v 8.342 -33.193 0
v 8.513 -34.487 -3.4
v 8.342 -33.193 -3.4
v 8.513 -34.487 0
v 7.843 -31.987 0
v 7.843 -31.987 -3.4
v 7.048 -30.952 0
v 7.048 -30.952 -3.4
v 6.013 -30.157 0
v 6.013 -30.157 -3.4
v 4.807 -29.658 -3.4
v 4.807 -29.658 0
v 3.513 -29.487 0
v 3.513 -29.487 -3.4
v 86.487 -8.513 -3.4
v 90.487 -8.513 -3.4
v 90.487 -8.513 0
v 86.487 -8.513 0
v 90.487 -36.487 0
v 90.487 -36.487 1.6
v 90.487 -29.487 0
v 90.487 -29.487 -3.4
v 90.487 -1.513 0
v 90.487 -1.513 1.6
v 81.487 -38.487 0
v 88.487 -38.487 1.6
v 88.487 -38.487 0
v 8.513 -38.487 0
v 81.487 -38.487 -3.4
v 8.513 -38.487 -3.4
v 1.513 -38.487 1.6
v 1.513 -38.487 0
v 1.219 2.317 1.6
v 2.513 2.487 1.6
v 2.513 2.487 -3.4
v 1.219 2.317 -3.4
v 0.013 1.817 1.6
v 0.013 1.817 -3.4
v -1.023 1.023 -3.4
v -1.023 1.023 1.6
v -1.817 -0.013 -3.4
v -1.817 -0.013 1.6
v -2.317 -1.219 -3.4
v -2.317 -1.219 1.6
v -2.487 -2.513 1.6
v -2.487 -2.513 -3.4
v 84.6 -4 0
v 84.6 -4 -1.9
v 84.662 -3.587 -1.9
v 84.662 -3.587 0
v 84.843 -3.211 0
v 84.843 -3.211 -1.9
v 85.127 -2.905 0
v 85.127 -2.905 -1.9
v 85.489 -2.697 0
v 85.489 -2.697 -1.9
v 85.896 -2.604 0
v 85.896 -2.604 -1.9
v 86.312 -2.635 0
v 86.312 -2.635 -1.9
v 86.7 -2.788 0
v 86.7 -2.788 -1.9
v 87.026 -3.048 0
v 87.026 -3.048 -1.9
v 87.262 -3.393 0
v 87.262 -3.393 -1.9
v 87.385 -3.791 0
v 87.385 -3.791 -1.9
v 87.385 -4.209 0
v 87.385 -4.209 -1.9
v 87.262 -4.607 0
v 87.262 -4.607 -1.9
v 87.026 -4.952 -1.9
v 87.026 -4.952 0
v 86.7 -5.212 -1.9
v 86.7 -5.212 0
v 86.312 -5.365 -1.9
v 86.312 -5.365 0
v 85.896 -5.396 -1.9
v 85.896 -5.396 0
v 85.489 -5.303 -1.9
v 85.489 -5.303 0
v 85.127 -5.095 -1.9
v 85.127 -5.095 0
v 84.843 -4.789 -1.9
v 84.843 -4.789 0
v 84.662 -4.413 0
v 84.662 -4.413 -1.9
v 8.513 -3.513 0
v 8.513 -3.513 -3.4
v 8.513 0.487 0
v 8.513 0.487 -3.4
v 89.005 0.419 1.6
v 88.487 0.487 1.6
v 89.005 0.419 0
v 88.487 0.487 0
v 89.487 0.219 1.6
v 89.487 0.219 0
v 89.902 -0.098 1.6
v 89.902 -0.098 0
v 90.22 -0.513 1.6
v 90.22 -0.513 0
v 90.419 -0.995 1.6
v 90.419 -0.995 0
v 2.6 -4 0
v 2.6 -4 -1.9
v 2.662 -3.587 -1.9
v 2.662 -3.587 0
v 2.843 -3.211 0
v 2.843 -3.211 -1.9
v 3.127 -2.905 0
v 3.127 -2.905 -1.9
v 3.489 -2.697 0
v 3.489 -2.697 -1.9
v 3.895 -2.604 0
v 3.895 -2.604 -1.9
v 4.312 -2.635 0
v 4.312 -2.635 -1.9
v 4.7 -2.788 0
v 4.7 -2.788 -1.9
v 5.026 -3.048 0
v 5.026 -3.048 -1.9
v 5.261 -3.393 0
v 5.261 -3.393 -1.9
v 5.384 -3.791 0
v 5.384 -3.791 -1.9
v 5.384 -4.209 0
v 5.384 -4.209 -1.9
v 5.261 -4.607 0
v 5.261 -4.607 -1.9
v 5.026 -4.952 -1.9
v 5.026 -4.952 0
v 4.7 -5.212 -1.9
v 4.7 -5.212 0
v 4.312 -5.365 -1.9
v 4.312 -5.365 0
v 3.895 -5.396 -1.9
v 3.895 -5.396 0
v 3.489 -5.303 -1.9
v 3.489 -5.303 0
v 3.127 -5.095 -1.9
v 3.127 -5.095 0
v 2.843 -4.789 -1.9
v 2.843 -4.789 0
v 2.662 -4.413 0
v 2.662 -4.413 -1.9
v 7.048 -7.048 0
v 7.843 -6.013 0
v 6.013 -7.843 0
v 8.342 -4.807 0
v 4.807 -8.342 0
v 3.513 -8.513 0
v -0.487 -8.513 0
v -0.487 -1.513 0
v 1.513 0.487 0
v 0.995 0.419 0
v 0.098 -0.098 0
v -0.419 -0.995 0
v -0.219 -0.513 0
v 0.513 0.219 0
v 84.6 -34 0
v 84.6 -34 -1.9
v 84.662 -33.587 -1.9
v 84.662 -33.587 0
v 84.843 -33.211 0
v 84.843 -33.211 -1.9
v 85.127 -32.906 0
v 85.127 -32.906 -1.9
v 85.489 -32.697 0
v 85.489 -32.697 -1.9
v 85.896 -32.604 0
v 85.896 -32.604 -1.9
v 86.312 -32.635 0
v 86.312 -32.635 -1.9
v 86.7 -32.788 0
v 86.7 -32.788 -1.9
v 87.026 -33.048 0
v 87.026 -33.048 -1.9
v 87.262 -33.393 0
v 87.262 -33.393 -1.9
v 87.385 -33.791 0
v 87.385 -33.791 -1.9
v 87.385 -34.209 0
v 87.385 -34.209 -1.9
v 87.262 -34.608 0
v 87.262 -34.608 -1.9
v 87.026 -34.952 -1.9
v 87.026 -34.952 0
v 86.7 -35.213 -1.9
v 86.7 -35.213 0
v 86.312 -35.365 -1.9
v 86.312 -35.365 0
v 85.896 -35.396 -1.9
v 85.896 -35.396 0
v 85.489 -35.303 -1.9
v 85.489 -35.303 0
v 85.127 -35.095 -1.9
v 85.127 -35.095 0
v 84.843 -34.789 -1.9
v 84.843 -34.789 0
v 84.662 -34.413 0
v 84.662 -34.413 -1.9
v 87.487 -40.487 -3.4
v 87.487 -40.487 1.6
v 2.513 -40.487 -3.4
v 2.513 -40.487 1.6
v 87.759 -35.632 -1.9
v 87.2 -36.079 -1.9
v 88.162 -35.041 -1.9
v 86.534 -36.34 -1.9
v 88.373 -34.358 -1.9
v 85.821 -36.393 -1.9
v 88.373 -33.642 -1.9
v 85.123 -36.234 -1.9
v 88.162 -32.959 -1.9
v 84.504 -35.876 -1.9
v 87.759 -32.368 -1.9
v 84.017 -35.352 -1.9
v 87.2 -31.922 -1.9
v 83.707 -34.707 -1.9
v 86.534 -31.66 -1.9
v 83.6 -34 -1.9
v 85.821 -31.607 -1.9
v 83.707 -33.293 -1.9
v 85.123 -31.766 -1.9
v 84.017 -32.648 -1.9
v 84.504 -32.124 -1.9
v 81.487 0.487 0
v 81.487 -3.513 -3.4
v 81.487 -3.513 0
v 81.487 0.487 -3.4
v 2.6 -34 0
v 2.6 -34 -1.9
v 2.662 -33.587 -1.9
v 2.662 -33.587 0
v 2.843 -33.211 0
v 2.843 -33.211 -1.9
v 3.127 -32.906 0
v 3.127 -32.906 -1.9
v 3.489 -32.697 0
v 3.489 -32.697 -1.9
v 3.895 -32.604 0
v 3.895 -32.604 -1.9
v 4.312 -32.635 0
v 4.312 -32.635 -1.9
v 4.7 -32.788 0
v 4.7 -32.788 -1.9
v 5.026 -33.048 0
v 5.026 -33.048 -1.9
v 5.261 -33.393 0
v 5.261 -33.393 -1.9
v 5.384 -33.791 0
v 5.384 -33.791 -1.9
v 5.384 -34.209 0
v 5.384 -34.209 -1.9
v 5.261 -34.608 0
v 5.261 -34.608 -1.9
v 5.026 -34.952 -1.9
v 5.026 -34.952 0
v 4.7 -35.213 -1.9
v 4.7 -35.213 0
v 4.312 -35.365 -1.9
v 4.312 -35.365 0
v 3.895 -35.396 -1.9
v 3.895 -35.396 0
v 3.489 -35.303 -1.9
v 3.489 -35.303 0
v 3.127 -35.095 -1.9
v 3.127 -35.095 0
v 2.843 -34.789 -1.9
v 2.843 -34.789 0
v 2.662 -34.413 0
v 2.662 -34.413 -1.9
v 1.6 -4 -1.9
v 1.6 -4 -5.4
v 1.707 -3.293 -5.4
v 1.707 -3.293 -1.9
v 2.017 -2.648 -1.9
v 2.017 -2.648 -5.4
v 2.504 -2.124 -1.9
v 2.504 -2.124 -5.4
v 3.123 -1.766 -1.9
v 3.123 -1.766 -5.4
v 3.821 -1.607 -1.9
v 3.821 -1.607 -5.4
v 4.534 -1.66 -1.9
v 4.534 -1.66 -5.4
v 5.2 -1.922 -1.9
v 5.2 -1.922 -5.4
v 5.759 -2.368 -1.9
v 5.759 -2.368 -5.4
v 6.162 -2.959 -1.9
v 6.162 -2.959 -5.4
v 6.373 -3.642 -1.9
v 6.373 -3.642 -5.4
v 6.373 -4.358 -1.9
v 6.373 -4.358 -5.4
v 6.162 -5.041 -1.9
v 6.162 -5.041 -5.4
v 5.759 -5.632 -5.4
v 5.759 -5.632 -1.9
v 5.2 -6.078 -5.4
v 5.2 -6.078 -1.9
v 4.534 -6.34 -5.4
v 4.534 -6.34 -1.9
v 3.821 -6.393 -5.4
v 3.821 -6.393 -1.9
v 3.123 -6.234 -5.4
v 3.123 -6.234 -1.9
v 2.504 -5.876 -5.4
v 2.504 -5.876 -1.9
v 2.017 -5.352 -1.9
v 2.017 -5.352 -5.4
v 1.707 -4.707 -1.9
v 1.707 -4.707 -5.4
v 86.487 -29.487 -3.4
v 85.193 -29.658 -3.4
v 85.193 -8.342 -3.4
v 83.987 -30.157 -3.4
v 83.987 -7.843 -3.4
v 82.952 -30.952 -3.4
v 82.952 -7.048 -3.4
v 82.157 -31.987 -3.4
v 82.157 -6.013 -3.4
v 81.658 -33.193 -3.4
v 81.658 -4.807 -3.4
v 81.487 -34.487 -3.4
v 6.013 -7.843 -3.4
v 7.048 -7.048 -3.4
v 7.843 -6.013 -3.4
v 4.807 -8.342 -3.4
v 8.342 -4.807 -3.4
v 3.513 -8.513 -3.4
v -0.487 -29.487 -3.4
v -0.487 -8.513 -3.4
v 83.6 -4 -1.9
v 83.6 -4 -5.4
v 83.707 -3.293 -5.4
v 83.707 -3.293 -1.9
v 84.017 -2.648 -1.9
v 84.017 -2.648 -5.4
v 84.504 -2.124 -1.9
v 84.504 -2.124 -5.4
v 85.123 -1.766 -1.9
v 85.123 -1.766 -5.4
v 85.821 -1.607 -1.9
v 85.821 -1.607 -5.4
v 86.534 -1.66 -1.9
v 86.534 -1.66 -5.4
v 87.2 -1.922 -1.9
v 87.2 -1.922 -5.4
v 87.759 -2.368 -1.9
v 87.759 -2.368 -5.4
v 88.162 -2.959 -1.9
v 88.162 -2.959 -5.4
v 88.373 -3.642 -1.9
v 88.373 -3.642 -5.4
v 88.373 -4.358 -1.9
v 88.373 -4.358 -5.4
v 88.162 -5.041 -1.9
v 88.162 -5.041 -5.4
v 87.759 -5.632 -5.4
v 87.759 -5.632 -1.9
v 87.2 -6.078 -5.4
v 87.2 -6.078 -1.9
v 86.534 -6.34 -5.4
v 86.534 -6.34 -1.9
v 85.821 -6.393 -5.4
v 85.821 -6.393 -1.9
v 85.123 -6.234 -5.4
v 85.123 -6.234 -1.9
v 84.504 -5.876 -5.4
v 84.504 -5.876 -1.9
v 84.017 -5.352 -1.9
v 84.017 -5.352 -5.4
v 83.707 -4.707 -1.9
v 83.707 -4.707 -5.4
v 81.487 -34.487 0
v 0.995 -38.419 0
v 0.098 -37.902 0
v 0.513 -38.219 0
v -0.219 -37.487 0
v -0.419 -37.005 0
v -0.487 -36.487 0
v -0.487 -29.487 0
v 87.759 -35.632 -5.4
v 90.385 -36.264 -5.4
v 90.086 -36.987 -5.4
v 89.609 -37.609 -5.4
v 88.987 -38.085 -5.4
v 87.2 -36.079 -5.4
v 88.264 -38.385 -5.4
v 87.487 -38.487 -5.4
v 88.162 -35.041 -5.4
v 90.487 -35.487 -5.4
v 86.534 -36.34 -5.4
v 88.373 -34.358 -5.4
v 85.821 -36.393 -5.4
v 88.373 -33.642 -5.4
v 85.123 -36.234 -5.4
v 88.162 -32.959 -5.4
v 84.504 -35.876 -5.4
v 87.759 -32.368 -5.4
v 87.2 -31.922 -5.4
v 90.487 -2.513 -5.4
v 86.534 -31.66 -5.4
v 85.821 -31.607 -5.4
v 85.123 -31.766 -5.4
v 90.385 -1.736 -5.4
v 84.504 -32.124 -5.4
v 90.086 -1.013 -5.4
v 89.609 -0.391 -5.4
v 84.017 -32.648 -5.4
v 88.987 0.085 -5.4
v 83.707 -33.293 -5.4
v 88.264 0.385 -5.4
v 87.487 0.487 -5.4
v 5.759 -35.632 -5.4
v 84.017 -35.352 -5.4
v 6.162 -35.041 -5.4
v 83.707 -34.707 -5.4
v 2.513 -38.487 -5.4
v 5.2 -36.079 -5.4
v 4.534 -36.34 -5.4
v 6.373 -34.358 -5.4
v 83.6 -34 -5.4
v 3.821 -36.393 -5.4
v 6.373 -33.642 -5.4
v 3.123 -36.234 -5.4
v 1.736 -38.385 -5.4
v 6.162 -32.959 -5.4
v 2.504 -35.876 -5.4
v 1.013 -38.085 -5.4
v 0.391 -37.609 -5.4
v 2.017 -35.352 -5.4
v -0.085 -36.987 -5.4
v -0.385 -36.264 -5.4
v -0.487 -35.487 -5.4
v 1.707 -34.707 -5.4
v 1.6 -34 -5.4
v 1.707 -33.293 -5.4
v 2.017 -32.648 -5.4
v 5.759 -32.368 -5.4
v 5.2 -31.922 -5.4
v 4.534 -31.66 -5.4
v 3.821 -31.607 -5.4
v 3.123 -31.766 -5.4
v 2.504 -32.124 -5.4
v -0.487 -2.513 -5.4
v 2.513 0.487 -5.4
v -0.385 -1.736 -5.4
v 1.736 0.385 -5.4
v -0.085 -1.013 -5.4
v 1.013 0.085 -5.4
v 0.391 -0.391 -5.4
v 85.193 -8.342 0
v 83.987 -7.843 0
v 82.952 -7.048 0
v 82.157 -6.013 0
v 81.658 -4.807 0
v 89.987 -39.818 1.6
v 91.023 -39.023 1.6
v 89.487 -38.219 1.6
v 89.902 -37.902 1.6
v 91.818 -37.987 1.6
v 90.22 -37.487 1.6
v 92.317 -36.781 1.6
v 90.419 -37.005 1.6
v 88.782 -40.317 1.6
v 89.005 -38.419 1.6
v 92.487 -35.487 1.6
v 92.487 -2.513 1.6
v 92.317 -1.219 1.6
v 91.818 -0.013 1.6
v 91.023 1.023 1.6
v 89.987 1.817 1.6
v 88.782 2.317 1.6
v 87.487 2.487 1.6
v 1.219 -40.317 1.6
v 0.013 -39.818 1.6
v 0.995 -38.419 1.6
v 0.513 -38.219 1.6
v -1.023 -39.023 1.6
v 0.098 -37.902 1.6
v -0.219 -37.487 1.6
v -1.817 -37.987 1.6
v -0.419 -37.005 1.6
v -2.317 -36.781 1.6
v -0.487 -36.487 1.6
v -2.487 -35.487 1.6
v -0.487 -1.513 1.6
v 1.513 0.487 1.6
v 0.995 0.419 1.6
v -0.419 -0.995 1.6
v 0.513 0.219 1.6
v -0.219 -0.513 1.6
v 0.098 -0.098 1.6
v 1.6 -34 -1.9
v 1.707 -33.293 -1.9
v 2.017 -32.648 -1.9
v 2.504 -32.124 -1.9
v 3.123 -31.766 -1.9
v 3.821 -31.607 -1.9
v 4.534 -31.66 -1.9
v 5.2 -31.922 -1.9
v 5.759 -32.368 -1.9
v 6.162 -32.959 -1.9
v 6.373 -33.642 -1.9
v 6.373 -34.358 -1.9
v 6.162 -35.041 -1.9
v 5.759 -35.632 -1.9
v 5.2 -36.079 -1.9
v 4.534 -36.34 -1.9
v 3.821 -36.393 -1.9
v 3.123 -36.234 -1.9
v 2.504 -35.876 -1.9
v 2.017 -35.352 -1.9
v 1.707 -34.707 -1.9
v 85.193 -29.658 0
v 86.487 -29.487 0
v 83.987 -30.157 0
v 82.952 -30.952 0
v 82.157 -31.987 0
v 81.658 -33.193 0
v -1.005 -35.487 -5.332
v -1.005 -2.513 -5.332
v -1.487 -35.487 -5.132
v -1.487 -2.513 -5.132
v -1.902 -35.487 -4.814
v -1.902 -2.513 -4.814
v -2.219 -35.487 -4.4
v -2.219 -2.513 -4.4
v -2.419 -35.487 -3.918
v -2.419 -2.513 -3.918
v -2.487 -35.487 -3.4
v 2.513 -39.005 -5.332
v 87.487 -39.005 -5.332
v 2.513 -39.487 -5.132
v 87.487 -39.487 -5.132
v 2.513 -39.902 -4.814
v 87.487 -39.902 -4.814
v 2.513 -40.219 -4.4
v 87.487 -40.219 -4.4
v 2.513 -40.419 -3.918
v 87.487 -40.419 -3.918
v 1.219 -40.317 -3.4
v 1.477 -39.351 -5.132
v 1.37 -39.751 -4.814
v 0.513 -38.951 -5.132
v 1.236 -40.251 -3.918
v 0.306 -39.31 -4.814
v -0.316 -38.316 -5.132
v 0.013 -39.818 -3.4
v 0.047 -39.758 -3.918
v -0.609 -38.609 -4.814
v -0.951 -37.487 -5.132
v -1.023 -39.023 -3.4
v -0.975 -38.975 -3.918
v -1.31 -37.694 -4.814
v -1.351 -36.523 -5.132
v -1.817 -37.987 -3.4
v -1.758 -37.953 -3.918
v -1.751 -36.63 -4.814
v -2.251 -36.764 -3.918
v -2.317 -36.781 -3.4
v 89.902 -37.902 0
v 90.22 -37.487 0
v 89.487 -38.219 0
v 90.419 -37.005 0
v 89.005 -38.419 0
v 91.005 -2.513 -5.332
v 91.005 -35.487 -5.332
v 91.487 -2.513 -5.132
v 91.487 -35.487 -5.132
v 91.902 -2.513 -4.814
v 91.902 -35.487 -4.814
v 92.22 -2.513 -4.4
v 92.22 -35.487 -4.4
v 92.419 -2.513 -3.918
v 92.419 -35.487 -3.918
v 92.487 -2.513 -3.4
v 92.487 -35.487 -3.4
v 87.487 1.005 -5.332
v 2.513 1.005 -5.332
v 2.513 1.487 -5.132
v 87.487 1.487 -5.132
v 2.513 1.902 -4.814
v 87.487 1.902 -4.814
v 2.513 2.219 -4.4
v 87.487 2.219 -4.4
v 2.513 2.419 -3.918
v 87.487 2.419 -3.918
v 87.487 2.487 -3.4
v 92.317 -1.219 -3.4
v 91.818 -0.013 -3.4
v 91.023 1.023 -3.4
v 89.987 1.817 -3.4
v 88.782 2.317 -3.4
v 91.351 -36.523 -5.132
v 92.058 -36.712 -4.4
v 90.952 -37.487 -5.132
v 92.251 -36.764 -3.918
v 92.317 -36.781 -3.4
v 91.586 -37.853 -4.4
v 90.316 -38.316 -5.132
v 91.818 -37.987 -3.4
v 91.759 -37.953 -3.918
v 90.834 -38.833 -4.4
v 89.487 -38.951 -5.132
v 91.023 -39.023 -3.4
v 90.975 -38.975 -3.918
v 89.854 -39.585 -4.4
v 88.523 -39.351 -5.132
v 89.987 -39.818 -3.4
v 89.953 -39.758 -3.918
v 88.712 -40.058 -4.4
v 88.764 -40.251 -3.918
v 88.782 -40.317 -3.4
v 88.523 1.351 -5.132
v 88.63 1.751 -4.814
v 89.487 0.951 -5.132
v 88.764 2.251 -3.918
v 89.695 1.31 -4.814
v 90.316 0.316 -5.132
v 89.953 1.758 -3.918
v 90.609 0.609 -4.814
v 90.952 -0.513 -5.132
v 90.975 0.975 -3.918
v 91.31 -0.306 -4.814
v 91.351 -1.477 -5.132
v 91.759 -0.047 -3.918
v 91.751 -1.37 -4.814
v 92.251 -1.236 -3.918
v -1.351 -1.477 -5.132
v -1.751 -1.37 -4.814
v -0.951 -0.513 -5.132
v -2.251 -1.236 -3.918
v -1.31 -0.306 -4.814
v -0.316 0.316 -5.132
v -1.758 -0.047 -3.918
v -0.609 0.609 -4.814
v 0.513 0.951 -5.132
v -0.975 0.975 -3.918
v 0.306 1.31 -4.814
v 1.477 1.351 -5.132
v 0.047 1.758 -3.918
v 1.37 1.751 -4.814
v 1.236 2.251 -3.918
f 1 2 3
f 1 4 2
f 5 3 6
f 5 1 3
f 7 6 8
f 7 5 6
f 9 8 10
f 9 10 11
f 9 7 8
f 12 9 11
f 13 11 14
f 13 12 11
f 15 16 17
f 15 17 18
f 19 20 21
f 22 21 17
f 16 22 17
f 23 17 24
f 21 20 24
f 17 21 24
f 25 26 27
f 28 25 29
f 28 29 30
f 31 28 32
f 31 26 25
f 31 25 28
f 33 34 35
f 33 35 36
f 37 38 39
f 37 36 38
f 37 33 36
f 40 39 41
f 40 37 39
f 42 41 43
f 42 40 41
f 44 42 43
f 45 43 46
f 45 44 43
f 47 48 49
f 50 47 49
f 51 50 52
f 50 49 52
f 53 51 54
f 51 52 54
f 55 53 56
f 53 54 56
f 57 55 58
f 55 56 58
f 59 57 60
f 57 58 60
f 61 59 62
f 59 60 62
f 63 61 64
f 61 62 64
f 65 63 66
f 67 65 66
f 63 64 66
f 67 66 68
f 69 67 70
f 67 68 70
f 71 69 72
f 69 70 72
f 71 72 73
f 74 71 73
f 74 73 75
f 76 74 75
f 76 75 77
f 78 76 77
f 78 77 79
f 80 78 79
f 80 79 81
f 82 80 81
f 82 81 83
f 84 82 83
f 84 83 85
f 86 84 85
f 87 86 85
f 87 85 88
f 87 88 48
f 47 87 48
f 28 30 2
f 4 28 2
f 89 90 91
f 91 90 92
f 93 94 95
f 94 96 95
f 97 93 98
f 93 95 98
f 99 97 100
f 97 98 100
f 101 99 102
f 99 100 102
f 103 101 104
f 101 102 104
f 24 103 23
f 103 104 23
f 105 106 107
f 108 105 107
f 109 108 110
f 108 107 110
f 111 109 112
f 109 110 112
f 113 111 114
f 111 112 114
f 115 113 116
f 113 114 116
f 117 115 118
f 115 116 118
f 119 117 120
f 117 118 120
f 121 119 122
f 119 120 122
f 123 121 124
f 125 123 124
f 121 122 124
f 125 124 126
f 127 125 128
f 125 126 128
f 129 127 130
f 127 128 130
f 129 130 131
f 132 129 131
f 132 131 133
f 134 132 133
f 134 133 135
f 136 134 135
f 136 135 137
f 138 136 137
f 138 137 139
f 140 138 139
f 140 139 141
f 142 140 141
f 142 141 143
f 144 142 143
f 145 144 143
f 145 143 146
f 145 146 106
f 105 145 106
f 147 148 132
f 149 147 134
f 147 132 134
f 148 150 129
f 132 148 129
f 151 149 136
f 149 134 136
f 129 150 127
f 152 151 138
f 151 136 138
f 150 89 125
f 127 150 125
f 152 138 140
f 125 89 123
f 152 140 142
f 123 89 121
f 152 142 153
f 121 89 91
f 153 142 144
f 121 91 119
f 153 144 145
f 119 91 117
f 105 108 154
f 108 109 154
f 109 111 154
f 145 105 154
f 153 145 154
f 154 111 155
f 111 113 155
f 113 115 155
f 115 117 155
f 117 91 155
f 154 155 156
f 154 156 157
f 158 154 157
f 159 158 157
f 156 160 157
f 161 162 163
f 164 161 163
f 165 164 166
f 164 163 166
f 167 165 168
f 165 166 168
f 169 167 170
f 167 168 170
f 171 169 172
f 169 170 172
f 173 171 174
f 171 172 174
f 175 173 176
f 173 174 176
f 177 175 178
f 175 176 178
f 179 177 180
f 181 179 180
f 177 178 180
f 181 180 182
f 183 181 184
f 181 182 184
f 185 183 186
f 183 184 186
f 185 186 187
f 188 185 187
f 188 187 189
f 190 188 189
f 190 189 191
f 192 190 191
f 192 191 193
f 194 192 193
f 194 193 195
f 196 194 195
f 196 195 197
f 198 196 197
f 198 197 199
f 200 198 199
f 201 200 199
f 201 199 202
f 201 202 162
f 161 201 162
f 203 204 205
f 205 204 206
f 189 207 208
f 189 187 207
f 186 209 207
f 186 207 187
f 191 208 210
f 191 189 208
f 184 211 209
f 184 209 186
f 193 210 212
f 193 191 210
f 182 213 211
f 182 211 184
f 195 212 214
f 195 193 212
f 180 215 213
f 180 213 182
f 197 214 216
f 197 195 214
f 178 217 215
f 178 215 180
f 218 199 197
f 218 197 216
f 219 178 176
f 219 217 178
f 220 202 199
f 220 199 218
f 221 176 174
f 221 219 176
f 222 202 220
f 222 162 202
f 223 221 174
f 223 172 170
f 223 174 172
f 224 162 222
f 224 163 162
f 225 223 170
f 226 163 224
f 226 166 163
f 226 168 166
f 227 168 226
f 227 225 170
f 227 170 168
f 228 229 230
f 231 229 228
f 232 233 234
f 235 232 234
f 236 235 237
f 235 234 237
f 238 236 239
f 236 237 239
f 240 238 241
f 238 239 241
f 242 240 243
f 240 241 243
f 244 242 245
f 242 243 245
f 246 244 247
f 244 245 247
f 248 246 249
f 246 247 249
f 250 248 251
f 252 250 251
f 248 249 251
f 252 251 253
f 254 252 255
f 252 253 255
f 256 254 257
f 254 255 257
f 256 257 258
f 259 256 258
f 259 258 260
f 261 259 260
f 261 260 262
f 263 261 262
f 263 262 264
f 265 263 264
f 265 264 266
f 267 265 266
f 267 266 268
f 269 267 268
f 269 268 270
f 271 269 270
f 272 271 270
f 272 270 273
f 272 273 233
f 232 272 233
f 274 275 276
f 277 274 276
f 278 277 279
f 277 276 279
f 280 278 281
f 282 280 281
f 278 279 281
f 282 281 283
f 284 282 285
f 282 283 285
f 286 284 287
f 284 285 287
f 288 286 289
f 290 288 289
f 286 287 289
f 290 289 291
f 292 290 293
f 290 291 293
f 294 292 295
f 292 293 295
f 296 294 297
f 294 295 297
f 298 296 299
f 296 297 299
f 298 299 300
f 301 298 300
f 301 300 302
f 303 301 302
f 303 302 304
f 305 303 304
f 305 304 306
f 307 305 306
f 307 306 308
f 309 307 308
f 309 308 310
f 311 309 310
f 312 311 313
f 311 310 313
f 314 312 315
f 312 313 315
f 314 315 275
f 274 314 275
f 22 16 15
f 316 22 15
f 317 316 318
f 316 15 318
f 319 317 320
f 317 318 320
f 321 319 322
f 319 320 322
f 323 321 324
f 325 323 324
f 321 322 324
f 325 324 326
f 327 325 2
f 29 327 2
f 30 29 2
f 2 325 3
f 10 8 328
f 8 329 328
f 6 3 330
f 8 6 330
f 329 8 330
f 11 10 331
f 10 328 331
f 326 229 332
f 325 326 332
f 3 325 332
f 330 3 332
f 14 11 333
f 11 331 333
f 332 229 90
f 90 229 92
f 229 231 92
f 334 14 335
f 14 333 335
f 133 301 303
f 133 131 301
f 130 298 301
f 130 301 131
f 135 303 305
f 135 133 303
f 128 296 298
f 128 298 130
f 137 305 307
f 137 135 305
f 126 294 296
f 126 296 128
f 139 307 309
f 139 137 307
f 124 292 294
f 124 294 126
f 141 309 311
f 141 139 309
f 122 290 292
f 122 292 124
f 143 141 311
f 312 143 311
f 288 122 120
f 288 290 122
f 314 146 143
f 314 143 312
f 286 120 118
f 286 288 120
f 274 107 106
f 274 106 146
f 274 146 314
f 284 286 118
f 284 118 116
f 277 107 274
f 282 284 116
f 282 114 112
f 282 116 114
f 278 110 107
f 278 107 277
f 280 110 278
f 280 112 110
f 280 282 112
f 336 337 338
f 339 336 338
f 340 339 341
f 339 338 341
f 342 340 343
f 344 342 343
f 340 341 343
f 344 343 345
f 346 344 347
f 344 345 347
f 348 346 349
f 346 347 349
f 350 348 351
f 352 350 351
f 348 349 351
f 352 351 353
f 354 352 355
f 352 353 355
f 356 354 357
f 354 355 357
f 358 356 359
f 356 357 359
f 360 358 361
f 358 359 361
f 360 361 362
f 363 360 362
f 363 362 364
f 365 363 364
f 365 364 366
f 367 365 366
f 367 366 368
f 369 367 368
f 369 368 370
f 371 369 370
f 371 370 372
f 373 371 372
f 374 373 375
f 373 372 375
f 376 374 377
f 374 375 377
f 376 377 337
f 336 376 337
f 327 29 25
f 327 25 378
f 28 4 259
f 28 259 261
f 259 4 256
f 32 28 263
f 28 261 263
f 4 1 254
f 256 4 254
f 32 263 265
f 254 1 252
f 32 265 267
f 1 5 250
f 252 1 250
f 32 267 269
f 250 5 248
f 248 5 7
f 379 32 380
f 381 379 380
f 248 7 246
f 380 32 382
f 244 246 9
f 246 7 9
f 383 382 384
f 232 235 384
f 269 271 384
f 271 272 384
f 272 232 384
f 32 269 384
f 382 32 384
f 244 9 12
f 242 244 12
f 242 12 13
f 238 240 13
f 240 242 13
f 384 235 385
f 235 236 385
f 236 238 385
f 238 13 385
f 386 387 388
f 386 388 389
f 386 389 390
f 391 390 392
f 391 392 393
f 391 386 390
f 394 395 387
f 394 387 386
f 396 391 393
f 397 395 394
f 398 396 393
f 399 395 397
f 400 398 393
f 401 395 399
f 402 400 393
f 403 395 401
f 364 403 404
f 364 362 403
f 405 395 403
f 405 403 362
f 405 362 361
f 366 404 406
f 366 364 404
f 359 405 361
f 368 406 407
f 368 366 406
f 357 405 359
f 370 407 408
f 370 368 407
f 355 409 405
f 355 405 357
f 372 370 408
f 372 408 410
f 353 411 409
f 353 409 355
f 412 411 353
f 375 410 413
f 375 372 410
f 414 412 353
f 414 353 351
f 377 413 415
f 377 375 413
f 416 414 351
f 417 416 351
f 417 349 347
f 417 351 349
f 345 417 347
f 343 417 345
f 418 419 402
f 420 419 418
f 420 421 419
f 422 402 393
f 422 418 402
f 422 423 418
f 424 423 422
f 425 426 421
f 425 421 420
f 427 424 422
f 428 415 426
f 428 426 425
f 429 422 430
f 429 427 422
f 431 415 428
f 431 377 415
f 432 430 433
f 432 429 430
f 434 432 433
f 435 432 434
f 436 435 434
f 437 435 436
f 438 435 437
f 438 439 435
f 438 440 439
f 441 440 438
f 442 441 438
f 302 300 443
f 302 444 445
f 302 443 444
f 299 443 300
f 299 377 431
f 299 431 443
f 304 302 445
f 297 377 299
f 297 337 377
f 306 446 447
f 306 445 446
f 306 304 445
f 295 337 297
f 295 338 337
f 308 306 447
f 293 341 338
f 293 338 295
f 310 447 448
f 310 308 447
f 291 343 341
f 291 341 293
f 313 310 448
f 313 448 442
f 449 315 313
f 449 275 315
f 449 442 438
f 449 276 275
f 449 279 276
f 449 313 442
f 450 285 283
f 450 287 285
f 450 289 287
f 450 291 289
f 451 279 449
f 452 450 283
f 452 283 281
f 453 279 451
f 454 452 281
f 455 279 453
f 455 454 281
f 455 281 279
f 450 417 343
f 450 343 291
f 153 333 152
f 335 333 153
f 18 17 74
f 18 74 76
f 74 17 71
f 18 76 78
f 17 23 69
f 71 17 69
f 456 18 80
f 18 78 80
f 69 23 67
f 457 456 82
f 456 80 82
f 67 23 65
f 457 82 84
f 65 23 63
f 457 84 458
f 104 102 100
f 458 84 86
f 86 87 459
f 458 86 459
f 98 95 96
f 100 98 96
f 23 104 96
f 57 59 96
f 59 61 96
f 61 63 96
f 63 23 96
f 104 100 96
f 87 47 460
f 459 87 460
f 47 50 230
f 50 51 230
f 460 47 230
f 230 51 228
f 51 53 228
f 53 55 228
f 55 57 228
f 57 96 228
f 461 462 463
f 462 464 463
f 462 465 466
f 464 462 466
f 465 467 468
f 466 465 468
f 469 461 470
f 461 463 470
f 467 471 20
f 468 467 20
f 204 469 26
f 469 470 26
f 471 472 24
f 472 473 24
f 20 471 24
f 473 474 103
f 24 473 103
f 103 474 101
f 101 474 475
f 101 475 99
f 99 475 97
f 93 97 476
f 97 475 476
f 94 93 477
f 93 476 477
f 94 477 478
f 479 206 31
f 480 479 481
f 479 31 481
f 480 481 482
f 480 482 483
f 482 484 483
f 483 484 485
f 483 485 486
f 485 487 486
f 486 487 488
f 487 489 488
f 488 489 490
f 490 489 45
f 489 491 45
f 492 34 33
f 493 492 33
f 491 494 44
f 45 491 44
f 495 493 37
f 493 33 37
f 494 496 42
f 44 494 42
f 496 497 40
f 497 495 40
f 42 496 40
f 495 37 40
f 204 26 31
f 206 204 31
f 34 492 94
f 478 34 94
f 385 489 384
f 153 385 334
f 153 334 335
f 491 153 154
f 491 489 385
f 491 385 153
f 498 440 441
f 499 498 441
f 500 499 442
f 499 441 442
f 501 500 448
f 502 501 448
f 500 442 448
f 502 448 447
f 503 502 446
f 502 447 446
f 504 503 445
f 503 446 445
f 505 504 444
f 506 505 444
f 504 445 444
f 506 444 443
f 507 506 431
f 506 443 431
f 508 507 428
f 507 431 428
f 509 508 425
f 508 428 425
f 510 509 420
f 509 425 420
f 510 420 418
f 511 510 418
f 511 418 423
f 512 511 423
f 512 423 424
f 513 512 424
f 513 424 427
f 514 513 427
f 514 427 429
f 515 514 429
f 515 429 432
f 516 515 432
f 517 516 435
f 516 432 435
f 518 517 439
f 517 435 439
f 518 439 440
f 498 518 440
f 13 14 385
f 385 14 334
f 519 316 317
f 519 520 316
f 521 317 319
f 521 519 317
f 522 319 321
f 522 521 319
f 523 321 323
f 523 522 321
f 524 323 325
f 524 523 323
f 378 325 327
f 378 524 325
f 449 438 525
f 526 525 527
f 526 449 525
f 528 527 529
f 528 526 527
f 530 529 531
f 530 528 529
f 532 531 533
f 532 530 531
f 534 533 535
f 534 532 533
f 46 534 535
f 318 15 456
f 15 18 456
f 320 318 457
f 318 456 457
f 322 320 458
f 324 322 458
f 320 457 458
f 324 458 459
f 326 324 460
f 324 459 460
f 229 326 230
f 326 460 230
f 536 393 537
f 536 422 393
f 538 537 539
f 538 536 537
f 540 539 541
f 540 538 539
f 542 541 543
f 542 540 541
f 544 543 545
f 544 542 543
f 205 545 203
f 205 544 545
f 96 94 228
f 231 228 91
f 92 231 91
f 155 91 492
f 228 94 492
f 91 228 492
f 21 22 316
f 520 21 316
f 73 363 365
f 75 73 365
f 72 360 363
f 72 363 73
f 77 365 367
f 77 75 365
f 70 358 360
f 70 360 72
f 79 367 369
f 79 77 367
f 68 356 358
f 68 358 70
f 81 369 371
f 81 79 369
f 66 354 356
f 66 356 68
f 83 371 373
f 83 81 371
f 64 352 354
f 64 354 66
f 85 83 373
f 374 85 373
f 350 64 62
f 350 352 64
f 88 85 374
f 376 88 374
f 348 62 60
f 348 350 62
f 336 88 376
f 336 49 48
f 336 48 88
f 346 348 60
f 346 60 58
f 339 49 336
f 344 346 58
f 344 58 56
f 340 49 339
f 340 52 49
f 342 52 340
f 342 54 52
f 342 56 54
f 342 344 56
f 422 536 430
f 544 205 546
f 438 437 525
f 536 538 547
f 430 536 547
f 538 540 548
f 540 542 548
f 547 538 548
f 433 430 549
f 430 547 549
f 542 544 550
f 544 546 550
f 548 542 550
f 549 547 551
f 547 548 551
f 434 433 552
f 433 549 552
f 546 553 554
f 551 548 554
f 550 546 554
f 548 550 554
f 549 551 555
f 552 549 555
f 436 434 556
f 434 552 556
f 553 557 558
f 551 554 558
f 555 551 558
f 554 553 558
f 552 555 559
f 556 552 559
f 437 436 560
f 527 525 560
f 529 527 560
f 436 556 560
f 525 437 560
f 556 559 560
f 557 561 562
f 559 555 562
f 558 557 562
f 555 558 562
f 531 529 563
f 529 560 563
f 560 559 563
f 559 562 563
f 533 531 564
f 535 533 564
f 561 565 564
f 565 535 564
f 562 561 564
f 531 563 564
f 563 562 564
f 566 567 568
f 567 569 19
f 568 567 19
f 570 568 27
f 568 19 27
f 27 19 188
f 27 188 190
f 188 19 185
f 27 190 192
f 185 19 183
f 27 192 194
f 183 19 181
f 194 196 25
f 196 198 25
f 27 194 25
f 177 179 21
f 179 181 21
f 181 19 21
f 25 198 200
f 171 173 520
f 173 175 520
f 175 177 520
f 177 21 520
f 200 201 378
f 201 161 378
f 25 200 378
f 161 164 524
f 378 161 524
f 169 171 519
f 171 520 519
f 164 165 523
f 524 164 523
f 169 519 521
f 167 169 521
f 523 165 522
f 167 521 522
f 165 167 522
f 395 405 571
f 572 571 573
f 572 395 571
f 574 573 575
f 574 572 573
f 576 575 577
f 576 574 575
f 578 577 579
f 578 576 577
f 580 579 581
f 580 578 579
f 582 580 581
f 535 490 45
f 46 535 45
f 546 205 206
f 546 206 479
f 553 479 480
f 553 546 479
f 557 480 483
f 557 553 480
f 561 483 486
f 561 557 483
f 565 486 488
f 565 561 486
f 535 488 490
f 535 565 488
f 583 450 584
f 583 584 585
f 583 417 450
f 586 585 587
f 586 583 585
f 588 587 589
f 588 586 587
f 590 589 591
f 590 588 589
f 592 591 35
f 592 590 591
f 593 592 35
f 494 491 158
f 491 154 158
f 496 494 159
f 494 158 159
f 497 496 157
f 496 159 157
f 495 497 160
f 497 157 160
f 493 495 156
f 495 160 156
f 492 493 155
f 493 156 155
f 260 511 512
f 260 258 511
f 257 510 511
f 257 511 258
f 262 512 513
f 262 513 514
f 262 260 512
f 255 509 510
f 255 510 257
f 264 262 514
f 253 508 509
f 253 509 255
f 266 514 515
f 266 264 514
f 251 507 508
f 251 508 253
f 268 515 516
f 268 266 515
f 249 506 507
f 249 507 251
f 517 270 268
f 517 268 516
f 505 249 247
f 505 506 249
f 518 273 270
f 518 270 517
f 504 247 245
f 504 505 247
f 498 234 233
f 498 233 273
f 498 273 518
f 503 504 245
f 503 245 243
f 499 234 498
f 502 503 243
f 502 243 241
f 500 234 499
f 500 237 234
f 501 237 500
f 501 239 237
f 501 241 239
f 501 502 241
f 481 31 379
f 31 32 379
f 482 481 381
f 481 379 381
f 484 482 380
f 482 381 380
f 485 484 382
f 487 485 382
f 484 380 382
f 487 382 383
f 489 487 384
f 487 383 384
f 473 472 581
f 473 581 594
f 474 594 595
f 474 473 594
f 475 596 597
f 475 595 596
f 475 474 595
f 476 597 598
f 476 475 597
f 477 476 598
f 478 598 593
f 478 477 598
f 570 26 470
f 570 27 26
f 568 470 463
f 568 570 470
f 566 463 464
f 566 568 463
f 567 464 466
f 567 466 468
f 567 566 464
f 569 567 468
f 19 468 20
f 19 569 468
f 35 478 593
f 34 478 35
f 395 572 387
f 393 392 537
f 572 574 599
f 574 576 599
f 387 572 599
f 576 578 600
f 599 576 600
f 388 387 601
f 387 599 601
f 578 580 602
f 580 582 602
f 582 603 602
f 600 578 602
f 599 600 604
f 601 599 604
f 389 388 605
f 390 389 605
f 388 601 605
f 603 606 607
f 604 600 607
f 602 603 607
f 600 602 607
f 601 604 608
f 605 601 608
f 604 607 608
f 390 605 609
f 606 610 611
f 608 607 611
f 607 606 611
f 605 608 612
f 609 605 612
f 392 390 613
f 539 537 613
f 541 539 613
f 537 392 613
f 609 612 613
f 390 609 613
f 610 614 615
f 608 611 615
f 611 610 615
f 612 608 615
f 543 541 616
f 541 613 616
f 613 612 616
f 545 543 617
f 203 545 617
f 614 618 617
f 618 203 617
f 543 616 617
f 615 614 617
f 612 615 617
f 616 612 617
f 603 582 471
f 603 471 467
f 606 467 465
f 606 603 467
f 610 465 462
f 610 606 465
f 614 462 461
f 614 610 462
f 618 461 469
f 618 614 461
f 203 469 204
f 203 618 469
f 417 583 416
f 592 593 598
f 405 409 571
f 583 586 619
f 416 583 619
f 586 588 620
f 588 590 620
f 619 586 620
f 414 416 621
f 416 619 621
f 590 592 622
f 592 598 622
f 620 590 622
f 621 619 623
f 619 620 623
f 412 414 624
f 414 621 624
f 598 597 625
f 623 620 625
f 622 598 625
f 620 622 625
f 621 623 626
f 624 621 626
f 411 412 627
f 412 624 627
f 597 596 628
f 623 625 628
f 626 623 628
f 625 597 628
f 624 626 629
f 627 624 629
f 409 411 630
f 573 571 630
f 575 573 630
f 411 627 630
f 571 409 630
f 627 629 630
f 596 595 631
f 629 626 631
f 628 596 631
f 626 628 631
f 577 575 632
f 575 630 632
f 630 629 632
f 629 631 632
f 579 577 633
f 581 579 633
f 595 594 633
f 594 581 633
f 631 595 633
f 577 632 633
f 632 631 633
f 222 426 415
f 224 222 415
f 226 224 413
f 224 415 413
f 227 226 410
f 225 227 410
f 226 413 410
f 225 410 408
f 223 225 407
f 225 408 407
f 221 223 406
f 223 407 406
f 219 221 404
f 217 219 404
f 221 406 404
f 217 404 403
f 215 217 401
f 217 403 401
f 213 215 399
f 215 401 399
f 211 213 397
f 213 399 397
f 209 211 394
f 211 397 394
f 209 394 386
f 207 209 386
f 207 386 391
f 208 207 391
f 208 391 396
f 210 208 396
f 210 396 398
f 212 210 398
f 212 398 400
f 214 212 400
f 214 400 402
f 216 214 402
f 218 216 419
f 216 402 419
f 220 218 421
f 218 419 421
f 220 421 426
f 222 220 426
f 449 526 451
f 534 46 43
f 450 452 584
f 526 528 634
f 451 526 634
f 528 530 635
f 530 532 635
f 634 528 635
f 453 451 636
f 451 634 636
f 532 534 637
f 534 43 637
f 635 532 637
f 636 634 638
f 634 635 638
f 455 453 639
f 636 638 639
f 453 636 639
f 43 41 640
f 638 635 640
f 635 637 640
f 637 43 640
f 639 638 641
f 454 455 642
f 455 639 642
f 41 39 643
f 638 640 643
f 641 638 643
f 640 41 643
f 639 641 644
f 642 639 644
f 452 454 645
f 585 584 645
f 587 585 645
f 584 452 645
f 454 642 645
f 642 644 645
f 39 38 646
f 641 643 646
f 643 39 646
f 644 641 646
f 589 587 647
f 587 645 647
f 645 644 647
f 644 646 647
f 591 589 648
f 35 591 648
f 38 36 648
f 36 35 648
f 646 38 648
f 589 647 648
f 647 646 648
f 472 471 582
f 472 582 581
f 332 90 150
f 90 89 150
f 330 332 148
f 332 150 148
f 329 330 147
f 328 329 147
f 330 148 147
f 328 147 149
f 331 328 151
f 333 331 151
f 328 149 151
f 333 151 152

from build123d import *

# Parameters (mm, degrees)
SKETCH_1_W          = 94.97478029
SKETCH_1_H          = 42.97467615
SKETCH_1_W_2        = 90.97478029
SKETCH_1_H_2        = 38.97467615
EXTRUDE_1_DEPTH     = 5
SKETCH_2_W          = 9
SKETCH_2_H          = 9
EXTRUDE_2_DEPTH     = 3.4
FILLET_1_R          = 5
SKETCH_3_W          = 94.97478029
SKETCH_3_H          = 42.97467615
EXTRUDE_3_DEPTH     = 2
SKETCH_4_R          = 2.4
CUT_EXTRUDE_1_DEPTH = 3.5
SKETCH_5_R          = 1.4
CUT_EXTRUDE_2_DEPTH = 102.021837464
FILLET_2_R          = 5
FILLET_3_R          = 2
FILLET_4_R          = 2


with BuildPart() as part:
    # 草图1 → 凸台-拉伸1 (new body)
    with BuildSketch(Plane(origin=(0, 0, 1.6000508), x_dir=(-1, 0, 0), z_dir=(0, 0, -1))):
        with Locations((-45.00009017, -19.0000381)):
            Rectangle(SKETCH_1_W, SKETCH_1_H)
        with Locations((-45.00009017, -19.0000381)):
            Rectangle(SKETCH_1_W_2, SKETCH_1_H_2, mode=Mode.SUBTRACT)
    extrude(amount=EXTRUDE_1_DEPTH)

    # 草图2 → 凸台-拉伸2 (add)
    with BuildSketch(Plane(origin=(0, 0, -3.3999492), x_dir=(-1, 0, 0), z_dir=(0, 0, -1))):
        with Locations((-85.987480315, -4.012700025)):
            Rectangle(SKETCH_2_W, SKETCH_2_H)
        with Locations((-4.012700025, -4.012700025)):
            Rectangle(SKETCH_2_W, SKETCH_2_H)
        with Locations((-4.012700025, -33.987376175)):
            Rectangle(SKETCH_2_W, SKETCH_2_H)
        with Locations((-85.987480315, -33.987376175)):
            Rectangle(SKETCH_2_W, SKETCH_2_H)
    extrude(amount=-EXTRUDE_2_DEPTH)

    # 圆角1
    fillet_1_edges = [part.edges().sort_by_distance(p)[0] for p in [
        (81.487480315, -29.487376175, -1.6999492),
        (8.512700025, -29.487376175, -1.6999492),
        (8.512700025, -8.512700025, -1.6999492),
        (81.487480315, -8.512700025, -1.6999492),
    ]]
    fillet(fillet_1_edges, radius=FILLET_1_R)

    # 草图3 → 凸台-拉伸3 (add)
    with BuildSketch(Plane(origin=(0, 0, -3.3999492), x_dir=(-1, 0, 0), z_dir=(0, 0, -1))):
        with Locations((-45.00009017, -19.0000381)):
            Rectangle(SKETCH_3_W, SKETCH_3_H)
    extrude(amount=EXTRUDE_3_DEPTH)

    # 草图4 → 切除-拉伸1 (cut)
    with BuildSketch(Plane(origin=(0, 0, -5.3999492), x_dir=(-1, 0, 0), z_dir=(0, 0, -1))):
        with Locations((-86.00017272, -4.00000762)):
            Circle(SKETCH_4_R)
        with Locations((-4.00000762, -4.00000762)):
            Circle(SKETCH_4_R)
        with Locations((-4.00000762, -34.00006858)):
            Circle(SKETCH_4_R)
        with Locations((-86.00017272, -34.00006858)):
            Circle(SKETCH_4_R)
    extrude(amount=-CUT_EXTRUDE_1_DEPTH, mode=Mode.SUBTRACT)

    # 草图5 → 切除-拉伸2 (cut, through all)
    with BuildSketch(Plane(origin=(0, 0, -1.8999492), x_dir=(-1, 0, 0), z_dir=(0, 0, -1))):
        with Locations((-86.00017272, -4.00000762)):
            Circle(SKETCH_5_R)
        with Locations((-4.00000762, -4.00000762)):
            Circle(SKETCH_5_R)
        with Locations((-4.00000762, -34.00006858)):
            Circle(SKETCH_5_R)
        with Locations((-86.00017272, -34.00006858)):
            Circle(SKETCH_5_R)
    extrude(amount=-CUT_EXTRUDE_2_DEPTH, mode=Mode.SUBTRACT)

    # 圆角2
    fillet_2_edges = [part.edges().sort_by_distance(p)[0] for p in [
        (92.487480315, 2.487299975, -1.8999492),
        (-2.487299975, 2.487299975, -1.8999492),
        (-2.487299975, -40.487376175, -1.8999492),
        (92.487480315, -40.487376175, -1.8999492),
    ]]
    fillet(fillet_2_edges, radius=FILLET_2_R)

    # 圆角3
    fillet_3_edges = [part.edges().sort_by_distance(p)[0] for p in [
        (45.00009017, -40.487376175, -5.3999492),
        (92.487480315, -19.0000381, -5.3999492),
        (-2.487299975, -19.0000381, -5.3999492),
        (45.00009017, 2.487299975, -5.3999492),
        (91.023014221, 1.022833881, -5.3999492),
        (-1.022833881, 1.022833881, -5.3999492),
        (-1.022833881, -39.022910081, -5.3999492),
        (91.023014221, -39.022910081, -5.3999492),
    ]]
    fillet(fillet_3_edges, radius=FILLET_3_R)

    # 圆角4
    fillet_4_edges = [part.edges().sort_by_distance(p)[0] for p in [
        (-0.487299975, 0.487299975, 0.8000508),
        (90.487480315, 0.487299975, 0.8000508),
        (-0.487299975, -38.487376175, 0.8000508),
        (90.487480315, -38.487376175, 0.8000508),
    ]]
    fillet(fillet_4_edges, radius=FILLET_4_R)


solid = part.part
